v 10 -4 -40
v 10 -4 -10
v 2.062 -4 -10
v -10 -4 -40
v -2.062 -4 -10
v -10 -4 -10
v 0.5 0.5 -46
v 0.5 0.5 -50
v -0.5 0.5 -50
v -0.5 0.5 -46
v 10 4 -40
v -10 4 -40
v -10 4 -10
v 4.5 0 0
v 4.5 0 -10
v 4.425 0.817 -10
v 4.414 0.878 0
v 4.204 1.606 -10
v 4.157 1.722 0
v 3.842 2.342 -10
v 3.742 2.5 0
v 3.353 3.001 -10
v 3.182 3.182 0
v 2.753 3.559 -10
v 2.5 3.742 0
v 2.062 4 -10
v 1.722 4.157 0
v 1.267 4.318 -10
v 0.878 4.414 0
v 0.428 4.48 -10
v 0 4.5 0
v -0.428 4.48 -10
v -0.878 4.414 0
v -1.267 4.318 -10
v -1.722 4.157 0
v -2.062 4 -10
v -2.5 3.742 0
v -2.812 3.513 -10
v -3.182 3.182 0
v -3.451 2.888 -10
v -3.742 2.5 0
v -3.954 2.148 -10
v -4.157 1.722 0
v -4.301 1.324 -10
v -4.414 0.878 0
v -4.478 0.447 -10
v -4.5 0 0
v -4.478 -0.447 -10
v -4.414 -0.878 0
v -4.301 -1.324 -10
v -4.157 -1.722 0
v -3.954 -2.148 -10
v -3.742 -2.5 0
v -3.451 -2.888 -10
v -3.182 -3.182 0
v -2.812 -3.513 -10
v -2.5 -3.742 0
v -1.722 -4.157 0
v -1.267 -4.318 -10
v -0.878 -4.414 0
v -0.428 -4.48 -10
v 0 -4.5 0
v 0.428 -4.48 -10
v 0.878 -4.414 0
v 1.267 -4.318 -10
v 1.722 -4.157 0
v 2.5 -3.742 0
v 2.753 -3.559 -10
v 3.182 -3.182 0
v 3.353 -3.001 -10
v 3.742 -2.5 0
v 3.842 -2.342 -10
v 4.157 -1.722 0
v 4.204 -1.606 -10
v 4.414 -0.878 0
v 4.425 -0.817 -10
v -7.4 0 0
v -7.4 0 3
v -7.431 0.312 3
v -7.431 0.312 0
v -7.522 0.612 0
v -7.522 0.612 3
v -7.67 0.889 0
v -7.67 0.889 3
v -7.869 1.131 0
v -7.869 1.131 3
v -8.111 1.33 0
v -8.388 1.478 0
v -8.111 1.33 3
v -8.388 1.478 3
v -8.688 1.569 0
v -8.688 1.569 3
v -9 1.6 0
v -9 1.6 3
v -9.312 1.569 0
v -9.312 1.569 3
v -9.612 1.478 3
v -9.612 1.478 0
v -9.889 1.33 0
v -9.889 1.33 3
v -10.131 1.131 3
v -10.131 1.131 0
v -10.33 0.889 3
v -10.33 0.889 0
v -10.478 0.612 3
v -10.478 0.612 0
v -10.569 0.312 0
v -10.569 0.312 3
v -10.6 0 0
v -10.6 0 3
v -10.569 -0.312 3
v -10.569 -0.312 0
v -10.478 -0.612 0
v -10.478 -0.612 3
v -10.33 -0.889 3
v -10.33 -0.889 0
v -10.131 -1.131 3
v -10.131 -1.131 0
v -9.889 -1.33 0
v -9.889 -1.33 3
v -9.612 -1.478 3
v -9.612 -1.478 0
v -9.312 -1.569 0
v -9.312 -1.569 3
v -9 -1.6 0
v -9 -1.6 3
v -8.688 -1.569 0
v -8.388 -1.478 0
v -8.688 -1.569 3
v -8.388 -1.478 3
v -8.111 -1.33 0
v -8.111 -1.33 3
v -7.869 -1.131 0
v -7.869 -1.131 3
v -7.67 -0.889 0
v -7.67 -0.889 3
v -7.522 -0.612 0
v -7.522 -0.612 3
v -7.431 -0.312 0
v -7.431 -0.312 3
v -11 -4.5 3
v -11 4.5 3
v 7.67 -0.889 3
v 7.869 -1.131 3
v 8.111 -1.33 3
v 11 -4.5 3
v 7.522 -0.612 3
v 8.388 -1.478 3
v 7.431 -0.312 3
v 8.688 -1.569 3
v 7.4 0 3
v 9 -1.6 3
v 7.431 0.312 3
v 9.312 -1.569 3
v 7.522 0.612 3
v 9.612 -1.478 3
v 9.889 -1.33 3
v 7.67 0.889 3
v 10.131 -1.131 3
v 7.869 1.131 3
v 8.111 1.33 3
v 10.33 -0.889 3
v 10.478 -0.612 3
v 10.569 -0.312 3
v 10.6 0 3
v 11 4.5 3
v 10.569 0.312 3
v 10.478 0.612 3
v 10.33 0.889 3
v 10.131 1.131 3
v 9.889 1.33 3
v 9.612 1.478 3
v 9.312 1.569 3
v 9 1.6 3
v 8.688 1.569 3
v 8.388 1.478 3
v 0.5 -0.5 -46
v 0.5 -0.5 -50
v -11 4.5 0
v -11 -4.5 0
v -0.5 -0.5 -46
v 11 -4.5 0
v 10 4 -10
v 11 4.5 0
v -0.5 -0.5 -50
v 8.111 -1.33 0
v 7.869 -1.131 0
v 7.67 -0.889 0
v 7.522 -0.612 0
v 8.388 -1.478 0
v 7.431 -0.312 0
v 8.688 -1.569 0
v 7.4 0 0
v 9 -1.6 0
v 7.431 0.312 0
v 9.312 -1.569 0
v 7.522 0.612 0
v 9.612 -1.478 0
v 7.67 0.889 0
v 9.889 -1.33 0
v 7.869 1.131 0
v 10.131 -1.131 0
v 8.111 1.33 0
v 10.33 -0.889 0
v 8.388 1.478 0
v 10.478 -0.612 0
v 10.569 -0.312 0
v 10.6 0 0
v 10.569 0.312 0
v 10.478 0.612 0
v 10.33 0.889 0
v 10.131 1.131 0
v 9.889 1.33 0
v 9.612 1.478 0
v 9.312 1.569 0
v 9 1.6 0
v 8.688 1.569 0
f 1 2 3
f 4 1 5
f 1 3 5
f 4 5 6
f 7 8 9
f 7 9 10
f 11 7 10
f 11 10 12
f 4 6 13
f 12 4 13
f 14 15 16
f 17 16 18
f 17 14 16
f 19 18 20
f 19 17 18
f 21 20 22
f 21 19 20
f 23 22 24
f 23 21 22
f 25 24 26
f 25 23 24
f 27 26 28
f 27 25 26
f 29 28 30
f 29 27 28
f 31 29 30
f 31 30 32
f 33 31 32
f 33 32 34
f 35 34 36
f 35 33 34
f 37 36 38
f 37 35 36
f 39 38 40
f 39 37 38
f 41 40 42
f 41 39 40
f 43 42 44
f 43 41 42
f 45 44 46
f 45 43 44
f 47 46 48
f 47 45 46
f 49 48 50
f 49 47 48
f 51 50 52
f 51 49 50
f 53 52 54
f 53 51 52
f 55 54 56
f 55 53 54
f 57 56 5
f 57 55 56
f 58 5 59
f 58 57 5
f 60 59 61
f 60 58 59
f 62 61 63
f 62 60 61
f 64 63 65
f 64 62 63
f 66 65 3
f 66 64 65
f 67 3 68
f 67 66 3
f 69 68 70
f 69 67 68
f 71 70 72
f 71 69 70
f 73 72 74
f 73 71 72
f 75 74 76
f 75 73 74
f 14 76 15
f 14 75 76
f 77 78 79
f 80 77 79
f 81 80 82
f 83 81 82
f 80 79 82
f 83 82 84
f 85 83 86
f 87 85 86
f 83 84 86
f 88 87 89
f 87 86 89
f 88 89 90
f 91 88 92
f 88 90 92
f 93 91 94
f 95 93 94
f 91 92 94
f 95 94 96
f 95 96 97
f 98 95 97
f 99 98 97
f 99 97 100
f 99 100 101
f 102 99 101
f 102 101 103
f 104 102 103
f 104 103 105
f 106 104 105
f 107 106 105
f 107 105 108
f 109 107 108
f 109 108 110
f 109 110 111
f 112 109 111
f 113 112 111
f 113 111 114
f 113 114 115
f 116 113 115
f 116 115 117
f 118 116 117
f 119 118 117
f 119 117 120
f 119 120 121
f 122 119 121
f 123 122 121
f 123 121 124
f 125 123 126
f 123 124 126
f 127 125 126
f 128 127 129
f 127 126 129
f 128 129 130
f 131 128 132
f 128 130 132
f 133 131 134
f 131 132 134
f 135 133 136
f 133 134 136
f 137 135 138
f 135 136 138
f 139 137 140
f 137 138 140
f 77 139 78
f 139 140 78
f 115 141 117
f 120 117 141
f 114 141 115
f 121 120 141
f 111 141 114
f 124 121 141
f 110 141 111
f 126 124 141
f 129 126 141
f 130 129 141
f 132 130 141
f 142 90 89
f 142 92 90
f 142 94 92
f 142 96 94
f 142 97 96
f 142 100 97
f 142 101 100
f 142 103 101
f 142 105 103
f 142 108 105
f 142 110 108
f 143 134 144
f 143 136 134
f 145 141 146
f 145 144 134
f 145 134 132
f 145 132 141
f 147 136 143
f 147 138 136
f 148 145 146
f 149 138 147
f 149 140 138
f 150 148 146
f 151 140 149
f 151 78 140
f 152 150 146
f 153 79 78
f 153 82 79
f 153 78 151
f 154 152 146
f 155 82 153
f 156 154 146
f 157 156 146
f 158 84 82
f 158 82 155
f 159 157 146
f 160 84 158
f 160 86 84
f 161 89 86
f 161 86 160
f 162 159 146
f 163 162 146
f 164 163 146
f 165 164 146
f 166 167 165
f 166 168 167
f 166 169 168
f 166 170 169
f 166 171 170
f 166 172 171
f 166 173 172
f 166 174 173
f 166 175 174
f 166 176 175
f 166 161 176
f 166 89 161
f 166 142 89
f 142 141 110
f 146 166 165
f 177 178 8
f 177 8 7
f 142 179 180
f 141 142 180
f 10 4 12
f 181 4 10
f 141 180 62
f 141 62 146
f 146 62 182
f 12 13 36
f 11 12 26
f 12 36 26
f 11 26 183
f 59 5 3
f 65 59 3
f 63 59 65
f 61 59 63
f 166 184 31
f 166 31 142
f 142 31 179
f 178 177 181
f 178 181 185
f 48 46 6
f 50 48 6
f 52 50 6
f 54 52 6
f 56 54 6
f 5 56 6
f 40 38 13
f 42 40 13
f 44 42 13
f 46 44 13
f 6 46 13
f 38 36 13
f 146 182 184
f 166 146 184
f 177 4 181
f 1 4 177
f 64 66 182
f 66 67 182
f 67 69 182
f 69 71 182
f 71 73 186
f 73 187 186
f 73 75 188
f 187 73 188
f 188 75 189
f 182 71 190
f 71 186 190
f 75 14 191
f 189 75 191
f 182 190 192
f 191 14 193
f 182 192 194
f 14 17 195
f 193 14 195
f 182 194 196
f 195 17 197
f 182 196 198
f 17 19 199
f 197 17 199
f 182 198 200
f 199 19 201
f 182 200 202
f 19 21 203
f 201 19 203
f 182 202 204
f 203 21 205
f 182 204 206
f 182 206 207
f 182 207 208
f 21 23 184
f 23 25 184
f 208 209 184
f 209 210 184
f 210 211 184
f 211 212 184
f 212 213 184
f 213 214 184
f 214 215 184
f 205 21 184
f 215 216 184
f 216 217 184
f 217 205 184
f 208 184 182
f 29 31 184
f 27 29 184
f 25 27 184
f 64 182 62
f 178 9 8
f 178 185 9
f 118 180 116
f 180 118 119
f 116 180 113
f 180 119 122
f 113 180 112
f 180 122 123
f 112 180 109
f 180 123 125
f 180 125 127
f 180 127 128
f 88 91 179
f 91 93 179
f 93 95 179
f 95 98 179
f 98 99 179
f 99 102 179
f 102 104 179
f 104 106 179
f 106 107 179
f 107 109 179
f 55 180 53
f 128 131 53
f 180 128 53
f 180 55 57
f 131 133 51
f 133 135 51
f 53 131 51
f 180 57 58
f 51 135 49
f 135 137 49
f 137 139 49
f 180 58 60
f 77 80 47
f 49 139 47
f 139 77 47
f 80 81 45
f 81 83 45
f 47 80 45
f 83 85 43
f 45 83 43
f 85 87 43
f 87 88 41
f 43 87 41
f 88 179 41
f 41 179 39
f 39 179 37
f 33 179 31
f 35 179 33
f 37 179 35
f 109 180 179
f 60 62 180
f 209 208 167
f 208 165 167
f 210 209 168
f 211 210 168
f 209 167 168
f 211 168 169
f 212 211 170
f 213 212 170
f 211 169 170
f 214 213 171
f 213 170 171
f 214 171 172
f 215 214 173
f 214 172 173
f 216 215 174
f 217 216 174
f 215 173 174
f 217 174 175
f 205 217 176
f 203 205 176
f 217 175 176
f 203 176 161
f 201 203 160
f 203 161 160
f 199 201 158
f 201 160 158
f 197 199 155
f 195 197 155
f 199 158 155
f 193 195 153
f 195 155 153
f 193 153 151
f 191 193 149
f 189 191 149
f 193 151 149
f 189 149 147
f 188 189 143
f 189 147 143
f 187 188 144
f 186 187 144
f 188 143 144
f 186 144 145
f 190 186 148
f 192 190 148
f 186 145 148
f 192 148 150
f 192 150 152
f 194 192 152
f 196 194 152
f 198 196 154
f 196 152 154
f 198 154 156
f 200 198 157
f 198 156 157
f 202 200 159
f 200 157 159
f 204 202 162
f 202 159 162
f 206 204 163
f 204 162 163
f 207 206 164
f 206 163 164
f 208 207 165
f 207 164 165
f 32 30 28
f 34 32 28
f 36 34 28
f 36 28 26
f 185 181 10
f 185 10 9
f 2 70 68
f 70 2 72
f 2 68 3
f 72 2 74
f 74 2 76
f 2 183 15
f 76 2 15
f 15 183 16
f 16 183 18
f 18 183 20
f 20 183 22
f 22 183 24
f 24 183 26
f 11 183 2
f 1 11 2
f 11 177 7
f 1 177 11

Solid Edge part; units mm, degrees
sketch "Sketch1" plane through (0, 0, 0) normal (0, 0, 1) x (1, 0, 0)
  circle A0 centre (0, 0) radius 4.5
  dimension "D1" = 9
extrude "Protrusion1" add sketch "Sketch1" against normal blind 10
sketch "Sketch2" plane through (0, 0, 0) normal (0, 0, 1) x (1, 0, 0)
  line L0 (-11, -4.5) -> (11, -4.5)
  line L1 (11, -4.5) -> (11, 4.5)
  line L2 (11, 4.5) -> (-11, 4.5)
  line L3 (-11, 4.5) -> (-11, -4.5)
  dimension "D1" = 22
  dimension "D2" = 9
extrude "Extrusionsausprägung_2" add sketch "Sketch2" along normal blind 3
sketch "Sketch3" plane through (0, 0, 3) normal (0, 0, 1) x (1, 0, 0)
  circle A0 centre (-9, 0) radius 1.6
  circle A1 centre (9, 0) radius 1.6
  dimension "D1" = 18
  dimension "D2" = 3.2
extrude "Cutout1" cut sketch "Sketch3" against normal through all
sketch "Sketch4" plane through (0, 0, -10) normal (0, 0, -1) x (1, 0, 0)
  line L0 (-10, -4) -> (10, -4)
  line L1 (10, -4) -> (10, 4)
  line L2 (10, 4) -> (-10, 4)
  line L3 (-10, 4) -> (-10, -4)
  dimension "D1" = 20
  dimension "D2" = 8
extrude "Extrusionsausprägung_3" add sketch "Sketch4" along normal blind 30
sketch "Sketch5" plane through (0, -4, -25) normal (0, -1, 0) x (1, 0, 0)
  line L0 (-10, -15) -> (-0.5, -21)
  line L1 (-0.5, -21) -> (-0.5, -25)
  line L2 (-0.5, -25) -> (0.5, -25)
  line L3 (0.5, -25) -> (0.5, -21)
  line L4 (0.5, -21) -> (10, -15)
  line L5 (10, -15) -> (-10, -15)
  dimension "D1" = 1
  dimension "D2" = 10
  dimension "D3" = 4
extrude "Protrusion2" add sketch "Sketch5" against normal up to vertex (8 mm away)
sketch "Sketch6" plane through (10, 0, -25) normal (1, 0, 0) x (0, 1, 0)
  line L0 (-4, -15) -> (-0.5, -21)
  line L1 (-0.5, -21) -> (-0.5, -25)
  line L2 (-0.5, -25) -> (0.5, -25)
  line L3 (0.5, -25) -> (0.5, -21)
  line L4 (0.5, -21) -> (4, -15)
  dimension "D1" = 1
extrude "Cutout2" cut sketch "Sketch6" against normal through all material side at (10, -2.2932, -43.0252)
properties part number "A7.E1"
